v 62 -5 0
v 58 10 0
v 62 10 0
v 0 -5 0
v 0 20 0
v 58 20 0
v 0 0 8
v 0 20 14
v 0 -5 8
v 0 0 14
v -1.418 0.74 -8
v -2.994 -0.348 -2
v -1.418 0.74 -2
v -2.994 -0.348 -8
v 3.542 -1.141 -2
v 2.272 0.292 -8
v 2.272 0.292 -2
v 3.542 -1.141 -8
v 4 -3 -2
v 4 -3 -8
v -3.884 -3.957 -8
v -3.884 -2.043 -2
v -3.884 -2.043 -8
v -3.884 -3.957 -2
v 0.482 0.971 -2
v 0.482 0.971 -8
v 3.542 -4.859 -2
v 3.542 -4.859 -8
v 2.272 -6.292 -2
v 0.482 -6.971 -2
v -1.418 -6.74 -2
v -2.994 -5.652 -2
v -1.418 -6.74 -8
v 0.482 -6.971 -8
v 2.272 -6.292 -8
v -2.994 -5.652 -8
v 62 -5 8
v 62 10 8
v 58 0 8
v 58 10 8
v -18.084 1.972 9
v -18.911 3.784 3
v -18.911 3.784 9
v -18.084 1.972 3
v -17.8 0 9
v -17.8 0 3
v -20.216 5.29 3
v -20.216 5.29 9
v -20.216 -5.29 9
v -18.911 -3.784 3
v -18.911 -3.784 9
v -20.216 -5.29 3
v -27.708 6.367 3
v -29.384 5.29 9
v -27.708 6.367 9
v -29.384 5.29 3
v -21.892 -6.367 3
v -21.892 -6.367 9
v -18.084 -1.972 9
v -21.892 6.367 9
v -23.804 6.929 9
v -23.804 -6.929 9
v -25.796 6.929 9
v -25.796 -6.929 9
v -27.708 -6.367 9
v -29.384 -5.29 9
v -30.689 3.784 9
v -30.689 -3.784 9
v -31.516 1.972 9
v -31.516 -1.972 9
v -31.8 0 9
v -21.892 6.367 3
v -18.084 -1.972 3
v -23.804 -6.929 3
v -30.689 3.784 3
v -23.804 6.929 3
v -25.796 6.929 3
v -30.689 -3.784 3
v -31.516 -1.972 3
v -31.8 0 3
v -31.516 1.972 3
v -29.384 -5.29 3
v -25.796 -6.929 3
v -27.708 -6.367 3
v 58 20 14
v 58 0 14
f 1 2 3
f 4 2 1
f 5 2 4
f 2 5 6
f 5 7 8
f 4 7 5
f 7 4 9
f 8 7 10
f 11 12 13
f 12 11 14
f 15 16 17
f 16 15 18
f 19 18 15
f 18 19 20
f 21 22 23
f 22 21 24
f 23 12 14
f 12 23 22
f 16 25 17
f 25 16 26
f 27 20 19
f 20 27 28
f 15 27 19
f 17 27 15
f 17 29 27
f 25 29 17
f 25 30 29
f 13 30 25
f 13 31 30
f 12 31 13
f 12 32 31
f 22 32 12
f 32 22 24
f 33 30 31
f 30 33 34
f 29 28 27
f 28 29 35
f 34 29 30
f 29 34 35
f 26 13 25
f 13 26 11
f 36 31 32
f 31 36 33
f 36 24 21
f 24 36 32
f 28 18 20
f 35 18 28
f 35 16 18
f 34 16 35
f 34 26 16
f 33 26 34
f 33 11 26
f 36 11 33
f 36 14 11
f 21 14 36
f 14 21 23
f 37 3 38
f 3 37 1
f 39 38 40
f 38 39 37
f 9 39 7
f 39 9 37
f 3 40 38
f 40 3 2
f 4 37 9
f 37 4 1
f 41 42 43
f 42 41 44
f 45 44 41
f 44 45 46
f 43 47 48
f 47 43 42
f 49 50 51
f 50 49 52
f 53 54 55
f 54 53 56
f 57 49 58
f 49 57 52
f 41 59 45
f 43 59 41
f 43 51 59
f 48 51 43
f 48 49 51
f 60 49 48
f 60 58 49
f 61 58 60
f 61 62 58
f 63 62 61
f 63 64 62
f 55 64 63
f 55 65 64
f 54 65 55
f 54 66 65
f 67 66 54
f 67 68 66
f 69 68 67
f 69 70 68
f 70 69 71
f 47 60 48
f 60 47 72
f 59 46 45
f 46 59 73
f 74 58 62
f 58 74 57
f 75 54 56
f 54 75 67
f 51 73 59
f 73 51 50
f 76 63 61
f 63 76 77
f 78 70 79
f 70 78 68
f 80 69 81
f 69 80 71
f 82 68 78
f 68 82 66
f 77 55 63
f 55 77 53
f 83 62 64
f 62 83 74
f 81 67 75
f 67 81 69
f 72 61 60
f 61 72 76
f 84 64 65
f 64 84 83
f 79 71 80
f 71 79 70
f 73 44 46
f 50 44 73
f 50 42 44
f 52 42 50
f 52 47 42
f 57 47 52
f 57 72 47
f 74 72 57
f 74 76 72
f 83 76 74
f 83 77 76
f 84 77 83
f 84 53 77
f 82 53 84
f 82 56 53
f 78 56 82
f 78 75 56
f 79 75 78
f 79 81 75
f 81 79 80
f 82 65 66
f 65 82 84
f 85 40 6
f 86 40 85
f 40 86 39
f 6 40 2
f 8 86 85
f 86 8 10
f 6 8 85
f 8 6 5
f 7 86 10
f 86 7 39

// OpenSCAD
// Sharp GP2Y0D413K0F Distance Sensor Housing Model
// Coordinate System: +Z = Up (Connector direction), +Y = Front/Lenses direction
// Units: mm

// --- Global Parameters & Tolerances ---
tolerance = 0.3; // Unspecified tolerance
pwb_thickness = 1.5; // Assumed thickness for PWB
case_material = "Carbonic ABS";

// ==============================================
// 1. Main Body Case (Housing)
// Based on overall dimensions, the case must encompass all components.
// Dimensions: Approx 56.3 (X length) x ~20 (Z height estimate based on components) x 17 (Y depth).
// We will model a slightly over-sized block to contain everything.
// ==============================================
module main_case(x_length, z_height, y_depth) {
    color([0.6, 0.6, 0.7]) cube([x_length, y_depth, z_height]); // Light blue/gray for ABS plastic
}

// ==============================================
// 2. PWB (Printed Circuit Board) and Connector Base
// Dimensions: L=39.4mm, W=16.3mm. Located near the bottom of the case.
// ==============================================
module pwbcase() {
    // A slight recess/base for mounting
    translate([0, -2, 0]) // Positioning slightly lower than main body floor (Z axis)
    cube([39.4, 16.3, pwb_thickness]);

    // Connector (Simplified representation of JCTC 12001W90-3P-HF)
    translate([0, -pwb_thickness*2, -5]) // Positioned on the edge of the PWB base
    cylinder(r=4, h=6, center=true);

    // Note: The main case should integrate around this. We assume the bottom part is cut out for mounting/access.
}

// ==============================================
// 3. Lens Assembly (Front Protrusion)
// This assembly extends along +Y from the main body face.
// ==============================================
module lens_assembly() {
    // General Housing Block for lenses
    translate([0, -5, 0]) // Positioned slightly in front of the main case plane
    cube([62, 15, 8]);

    // --- A. Emitter Lens (Circular, Left Side) ---
    // Center position: X approx -24.8 mm. Window size estimated (e.g., 7mm diameter).
    translate([-24.8, 0, 3]) // Positioned on the left side of the protrusion housing
    color([1, 0, 0, 0.5]) cylinder(r=7, h=6); // Redish semi-transparent window

    // --- B. Detector Lens (Rectangular, Right Side) ---
    // Center position: X approx 24.8 mm. Visible dimensions estimated (~10mm width, ~5mm height).
    translate([24.8, 0, 3]) // Positioned on the right side of the protrusion housing
    color([0, 0, 1, 0.5]) cube([10, 5, 1]); // Blueish semi-transparent window (Cube approximation)

    // Add a simple bezel/rim around the lenses for structural integrity
}


// ==============================================
// 4. Final Composition and Assembly
// Estimate dimensions to encompass all parts:
// X Max: ~30 mm (Detector side)
// X Min: ~-28 mm (Emitter side) -> Total Length L_X = 58 mm
// Y Depth: ~17 mm (PWB depth + protrusion length)
// Z Height: ~14 mm (Case height estimate)
// ==============================================

union() {
    // Main Body Case (The large outer shell)
    main_case(x_length = 58, z_height = 14, y_depth = 20);

    // PWB and Connector Base (Placed inside/on the bottom of the case)
    pwbcase();

    // Lens Assembly (Protrusion) - This structure is complexly integrated into the main case volume.
    lens_assembly();
}
